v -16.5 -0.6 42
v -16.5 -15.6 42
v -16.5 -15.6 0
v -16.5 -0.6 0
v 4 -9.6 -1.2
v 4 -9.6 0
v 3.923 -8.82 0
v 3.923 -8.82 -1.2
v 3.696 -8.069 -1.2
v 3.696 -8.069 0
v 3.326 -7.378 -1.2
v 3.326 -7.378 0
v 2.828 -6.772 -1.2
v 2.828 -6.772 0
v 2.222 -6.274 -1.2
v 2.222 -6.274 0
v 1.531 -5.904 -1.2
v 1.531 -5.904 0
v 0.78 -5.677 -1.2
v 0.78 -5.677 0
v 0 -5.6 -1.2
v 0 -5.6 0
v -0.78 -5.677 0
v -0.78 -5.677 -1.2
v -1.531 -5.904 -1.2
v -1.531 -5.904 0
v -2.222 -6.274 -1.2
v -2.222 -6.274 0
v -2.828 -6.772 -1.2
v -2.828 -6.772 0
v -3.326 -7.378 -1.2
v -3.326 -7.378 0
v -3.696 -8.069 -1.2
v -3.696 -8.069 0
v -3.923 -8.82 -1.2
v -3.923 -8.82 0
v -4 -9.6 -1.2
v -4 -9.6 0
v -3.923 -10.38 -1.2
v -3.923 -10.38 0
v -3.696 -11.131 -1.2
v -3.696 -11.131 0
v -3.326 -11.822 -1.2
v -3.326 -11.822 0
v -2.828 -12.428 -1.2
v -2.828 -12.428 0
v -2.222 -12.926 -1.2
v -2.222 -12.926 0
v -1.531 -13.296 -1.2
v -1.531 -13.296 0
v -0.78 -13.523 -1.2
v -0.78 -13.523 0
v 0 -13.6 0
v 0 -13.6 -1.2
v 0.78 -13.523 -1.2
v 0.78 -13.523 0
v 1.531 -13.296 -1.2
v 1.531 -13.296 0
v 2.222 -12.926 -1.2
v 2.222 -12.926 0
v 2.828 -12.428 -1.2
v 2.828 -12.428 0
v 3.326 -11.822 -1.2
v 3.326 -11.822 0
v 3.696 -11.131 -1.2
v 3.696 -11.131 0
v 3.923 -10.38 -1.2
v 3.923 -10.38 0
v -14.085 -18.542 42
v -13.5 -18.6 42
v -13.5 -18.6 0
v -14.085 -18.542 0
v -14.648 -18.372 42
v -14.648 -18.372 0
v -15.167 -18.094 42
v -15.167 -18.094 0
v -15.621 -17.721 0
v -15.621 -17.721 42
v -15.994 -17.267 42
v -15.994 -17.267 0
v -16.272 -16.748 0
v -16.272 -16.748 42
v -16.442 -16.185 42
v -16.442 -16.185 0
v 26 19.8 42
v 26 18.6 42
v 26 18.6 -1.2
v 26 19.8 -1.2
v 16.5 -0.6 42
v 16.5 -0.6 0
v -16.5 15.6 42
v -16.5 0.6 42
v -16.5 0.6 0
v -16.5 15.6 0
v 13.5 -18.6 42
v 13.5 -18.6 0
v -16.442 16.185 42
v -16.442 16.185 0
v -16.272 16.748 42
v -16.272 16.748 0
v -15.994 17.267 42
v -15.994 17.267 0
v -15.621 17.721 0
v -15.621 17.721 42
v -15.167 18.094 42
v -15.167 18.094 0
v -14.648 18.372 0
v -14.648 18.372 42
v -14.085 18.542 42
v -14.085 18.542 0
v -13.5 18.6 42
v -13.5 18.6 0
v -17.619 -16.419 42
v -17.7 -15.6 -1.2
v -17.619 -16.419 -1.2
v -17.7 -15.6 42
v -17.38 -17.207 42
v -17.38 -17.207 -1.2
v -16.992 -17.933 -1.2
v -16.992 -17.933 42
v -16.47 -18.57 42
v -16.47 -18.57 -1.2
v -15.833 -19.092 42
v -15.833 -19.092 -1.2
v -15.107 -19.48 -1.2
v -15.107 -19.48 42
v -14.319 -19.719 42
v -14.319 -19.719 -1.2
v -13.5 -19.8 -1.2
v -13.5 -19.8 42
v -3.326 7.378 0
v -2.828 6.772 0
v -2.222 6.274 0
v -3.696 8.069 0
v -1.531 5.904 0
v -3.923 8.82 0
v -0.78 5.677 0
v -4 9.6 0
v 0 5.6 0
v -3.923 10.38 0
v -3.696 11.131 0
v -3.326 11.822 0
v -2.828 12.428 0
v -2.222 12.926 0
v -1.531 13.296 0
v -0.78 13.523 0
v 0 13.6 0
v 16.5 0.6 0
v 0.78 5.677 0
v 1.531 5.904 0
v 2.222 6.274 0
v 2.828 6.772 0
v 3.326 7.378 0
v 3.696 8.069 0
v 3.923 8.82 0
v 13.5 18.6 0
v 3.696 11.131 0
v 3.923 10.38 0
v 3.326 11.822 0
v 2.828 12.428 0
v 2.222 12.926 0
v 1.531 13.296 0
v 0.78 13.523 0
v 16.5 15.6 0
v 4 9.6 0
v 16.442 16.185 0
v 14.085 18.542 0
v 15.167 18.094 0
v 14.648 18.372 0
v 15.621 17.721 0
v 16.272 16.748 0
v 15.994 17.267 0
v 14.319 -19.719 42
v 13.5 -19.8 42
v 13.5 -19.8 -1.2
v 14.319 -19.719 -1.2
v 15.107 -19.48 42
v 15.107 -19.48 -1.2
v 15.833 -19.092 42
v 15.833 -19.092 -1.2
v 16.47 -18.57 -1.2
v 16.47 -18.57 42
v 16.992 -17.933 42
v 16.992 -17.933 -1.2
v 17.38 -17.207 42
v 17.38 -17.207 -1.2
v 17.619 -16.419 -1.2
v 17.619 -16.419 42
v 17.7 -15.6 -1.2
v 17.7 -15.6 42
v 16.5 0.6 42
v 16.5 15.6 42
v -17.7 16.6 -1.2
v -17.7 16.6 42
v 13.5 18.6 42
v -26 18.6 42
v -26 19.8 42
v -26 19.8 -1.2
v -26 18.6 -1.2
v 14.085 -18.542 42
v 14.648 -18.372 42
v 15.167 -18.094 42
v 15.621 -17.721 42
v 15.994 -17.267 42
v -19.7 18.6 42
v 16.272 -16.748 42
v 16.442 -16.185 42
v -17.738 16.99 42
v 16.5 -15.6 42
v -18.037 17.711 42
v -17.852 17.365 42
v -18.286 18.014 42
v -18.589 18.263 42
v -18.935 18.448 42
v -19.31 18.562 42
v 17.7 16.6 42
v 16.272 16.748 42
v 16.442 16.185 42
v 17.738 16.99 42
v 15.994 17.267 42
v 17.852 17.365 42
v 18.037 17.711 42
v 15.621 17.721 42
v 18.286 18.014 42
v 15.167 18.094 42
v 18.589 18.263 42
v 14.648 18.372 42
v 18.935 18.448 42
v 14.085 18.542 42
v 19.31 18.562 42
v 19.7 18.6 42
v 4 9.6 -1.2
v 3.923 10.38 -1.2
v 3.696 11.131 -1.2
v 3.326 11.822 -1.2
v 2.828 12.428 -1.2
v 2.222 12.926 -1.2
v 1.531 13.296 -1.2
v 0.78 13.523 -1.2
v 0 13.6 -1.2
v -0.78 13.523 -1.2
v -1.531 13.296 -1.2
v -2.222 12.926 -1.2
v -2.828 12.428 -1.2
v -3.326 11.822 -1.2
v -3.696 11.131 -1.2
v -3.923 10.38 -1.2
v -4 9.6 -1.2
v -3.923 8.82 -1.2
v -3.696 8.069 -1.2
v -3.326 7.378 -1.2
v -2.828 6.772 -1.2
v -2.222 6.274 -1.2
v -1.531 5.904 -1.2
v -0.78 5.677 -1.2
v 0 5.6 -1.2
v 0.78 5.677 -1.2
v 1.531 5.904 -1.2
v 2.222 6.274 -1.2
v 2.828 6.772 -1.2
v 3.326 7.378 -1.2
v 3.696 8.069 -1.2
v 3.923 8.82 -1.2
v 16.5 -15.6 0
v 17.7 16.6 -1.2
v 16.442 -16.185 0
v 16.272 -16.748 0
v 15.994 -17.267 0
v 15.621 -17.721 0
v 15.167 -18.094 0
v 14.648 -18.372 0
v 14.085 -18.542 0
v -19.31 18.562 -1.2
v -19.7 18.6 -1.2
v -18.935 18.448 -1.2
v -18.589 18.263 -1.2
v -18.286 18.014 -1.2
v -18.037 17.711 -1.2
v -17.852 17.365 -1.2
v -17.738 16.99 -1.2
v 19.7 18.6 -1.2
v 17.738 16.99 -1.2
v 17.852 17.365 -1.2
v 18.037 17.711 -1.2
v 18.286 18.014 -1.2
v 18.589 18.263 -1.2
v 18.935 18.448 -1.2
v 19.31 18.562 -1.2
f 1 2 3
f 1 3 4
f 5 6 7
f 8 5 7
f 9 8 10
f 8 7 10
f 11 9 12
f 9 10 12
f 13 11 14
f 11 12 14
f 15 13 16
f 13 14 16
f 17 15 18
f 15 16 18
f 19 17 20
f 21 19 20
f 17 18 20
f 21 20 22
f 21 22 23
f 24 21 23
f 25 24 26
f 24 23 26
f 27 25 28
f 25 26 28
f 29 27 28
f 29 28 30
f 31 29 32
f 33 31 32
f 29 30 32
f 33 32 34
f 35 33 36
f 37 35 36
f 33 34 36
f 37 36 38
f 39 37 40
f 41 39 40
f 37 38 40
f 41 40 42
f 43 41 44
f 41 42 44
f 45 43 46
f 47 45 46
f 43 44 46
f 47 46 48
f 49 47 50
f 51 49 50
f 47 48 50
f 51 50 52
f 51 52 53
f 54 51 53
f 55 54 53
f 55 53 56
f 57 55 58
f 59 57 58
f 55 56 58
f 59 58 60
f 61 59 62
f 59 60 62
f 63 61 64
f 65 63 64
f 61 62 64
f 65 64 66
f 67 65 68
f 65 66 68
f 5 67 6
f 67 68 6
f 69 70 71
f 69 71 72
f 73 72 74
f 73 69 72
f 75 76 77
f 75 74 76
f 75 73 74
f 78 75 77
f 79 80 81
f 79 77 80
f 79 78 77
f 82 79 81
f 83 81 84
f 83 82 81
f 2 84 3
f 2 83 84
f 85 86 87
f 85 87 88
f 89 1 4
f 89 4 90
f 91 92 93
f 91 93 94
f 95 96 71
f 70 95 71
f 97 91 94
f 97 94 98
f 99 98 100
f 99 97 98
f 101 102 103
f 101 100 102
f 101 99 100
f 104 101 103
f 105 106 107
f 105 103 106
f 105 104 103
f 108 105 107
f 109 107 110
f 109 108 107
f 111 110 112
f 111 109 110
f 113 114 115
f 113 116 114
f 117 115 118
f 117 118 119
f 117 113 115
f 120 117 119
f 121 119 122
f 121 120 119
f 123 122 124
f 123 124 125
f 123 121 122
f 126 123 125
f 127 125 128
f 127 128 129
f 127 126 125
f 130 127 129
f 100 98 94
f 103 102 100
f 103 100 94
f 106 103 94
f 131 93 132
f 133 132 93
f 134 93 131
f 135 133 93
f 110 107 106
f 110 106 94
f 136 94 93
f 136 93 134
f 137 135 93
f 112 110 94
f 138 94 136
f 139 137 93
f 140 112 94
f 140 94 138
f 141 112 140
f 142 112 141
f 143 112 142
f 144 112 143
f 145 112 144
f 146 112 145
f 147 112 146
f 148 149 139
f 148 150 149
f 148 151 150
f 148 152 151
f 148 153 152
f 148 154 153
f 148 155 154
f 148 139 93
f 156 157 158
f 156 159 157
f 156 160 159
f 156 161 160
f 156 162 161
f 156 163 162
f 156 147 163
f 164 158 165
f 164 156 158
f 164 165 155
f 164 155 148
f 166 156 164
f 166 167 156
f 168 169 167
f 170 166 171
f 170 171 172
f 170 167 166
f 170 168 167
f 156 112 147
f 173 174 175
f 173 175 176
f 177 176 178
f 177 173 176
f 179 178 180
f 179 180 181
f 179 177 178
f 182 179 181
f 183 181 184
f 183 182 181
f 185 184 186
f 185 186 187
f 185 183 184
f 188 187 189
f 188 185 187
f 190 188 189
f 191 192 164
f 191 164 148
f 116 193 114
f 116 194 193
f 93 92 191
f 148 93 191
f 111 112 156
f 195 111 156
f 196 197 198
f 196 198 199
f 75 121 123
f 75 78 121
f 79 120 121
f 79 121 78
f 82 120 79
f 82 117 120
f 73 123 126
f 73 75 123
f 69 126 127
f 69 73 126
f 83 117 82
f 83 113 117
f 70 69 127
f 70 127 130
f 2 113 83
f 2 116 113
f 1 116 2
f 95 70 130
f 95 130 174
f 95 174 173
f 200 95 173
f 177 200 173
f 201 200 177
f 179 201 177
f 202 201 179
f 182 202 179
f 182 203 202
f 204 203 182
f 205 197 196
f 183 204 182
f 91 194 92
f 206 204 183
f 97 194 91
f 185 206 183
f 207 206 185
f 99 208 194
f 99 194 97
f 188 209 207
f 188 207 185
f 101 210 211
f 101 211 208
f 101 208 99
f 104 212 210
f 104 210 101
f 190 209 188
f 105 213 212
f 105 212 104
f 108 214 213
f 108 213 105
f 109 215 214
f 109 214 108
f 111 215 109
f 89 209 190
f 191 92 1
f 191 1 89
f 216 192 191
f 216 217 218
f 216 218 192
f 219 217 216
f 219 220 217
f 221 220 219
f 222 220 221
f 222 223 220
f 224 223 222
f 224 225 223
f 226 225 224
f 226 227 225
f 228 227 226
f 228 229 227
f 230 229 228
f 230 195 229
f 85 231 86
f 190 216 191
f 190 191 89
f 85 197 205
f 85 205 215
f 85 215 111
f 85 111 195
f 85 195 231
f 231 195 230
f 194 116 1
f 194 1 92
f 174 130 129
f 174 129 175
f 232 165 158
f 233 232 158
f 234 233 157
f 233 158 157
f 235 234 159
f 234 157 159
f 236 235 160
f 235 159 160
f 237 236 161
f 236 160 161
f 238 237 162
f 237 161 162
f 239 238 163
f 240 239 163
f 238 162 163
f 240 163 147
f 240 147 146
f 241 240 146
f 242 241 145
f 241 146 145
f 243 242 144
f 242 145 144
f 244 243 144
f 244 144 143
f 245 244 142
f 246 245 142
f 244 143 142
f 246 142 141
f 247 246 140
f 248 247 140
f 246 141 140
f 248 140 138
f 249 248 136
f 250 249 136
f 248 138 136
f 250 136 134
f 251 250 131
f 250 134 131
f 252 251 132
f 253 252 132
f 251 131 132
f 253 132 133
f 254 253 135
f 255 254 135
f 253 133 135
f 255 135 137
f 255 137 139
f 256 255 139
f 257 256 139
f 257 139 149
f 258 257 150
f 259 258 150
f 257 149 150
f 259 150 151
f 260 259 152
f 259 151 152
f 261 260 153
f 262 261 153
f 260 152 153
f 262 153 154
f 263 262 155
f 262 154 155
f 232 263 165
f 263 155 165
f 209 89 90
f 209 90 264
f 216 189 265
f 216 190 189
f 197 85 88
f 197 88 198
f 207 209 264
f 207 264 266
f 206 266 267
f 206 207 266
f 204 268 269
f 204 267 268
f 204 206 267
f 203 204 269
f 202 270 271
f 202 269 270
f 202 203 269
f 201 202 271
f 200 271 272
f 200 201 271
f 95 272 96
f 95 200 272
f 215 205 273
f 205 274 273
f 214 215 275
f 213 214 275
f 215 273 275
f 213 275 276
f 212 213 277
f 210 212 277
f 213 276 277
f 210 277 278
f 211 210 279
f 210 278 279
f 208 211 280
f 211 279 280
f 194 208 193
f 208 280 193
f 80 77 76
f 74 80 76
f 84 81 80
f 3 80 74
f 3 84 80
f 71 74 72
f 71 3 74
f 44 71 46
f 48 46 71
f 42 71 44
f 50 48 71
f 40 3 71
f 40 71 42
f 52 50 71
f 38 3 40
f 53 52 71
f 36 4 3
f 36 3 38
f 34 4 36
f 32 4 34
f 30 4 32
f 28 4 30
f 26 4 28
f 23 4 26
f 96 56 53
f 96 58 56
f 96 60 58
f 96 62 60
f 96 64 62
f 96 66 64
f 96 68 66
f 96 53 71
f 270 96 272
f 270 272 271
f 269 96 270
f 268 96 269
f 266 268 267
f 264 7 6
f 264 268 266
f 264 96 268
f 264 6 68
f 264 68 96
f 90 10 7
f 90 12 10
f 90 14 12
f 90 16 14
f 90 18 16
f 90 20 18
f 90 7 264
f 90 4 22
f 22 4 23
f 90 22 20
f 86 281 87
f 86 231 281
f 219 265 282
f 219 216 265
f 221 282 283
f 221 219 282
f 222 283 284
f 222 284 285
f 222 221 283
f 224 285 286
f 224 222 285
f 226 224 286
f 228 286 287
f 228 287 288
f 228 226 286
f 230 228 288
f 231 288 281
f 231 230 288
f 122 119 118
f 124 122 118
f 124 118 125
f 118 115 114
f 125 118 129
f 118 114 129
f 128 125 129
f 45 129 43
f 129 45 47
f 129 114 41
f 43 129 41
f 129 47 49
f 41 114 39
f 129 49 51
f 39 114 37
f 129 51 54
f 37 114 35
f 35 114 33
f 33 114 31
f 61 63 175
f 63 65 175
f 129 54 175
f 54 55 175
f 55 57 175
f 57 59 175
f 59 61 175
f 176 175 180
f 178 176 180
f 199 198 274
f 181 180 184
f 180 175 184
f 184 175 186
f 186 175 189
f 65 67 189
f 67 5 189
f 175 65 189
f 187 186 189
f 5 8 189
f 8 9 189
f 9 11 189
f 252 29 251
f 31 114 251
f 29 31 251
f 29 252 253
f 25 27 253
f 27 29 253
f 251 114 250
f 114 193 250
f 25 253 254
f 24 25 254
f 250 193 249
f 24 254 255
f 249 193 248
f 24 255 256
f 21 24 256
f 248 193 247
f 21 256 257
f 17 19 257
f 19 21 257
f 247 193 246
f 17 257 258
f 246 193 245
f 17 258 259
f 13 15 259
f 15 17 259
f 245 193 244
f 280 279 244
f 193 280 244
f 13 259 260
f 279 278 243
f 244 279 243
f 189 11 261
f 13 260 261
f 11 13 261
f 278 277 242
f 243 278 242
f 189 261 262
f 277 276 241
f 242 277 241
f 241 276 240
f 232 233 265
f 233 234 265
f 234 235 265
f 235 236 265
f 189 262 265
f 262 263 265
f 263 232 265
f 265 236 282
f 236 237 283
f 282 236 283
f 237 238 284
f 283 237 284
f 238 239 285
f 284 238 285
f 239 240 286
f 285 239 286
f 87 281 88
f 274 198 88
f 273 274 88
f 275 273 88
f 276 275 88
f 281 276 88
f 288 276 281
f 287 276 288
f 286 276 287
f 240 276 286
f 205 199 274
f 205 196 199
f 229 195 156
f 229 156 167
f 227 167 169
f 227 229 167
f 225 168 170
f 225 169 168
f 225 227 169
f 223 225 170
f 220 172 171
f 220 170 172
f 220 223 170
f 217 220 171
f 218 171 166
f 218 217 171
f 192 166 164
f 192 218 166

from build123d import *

# Parameters (mm, degrees)
F0_W          = 33
F0_H          = 1.2
F1_DEPTH      = 42
F1_DEPTH_BACK = 1.2
F0_R          = 4
F2_DEPTH      = 1.2
F3_R          = 2


with BuildPart() as f1:
    # F0 (on Top) → F1 (new body, two sides)
    with BuildSketch(Plane.XY) as f1_sk:
        with BuildLine():
            Line((-17.7, 15.6), (-17.7, -15.6))
            ThreePointArc((-17.7, -15.6), (-16.469848, -18.569848), (-13.5, -19.8))
            Line((-13.5, -19.8), (13.5, -19.8))
            ThreePointArc((13.5, -19.8), (16.469848, -18.569848), (17.7, -15.6))
            Line((17.7, -15.6), (17.7, 15.6))
            Line((17.7, 15.6), (17.7, 18.6))
            Line((17.7, 18.6), (26, 18.6))
            Line((26, 18.6), (26, 19.8))
            Line((26, 19.8), (-26, 19.8))
            Line((-26, 19.8), (-26, 18.6))
            Line((-26, 18.6), (-17.7, 18.6))
            Line((-17.7, 18.6), (-17.7, 15.6))
        make_face()
        with BuildLine():
            ThreePointArc((16.5, -15.6), (15.62132, -17.72132), (13.5, -18.6))
            Line((13.5, -18.6), (-13.5, -18.6))
            ThreePointArc((-13.5, -18.6), (-15.62132, -17.72132), (-16.5, -15.6))
            Line((-16.5, -15.6), (-16.5, -0.6))
            Line((-16.5, -0.6), (-16.5, 0.6))
            Line((-16.5, 0.6), (-16.5, 15.6))
            ThreePointArc((-16.5, 15.6), (-15.62132, 17.72132), (-13.5, 18.6))
            Line((-13.5, 18.6), (13.5, 18.6))
            ThreePointArc((13.5, 18.6), (15.62132, 17.72132), (16.5, 15.6))
            Line((16.5, 15.6), (16.5, 0.6))
            Line((16.5, 0.6), (16.5, -0.6))
            Line((16.5, -0.6), (16.5, -15.6))
        make_face(mode=Mode.SUBTRACT)
        Rectangle(F0_W, F0_H)
    extrude(amount=F1_DEPTH)
    extrude(f1_sk.sketch, amount=-F1_DEPTH_BACK)

    # F0 (on Top) → F2 (join)
    with BuildSketch(Plane.XY):
        with BuildLine():
            Line((-16.5, 0.6), (16.5, 0.6))
            Line((16.5, 0.6), (16.5, 15.6))
            ThreePointArc((16.5, 15.6), (15.62132, 17.72132), (13.5, 18.6))
            Line((13.5, 18.6), (-13.5, 18.6))
            ThreePointArc((-13.5, 18.6), (-15.62132, 17.72132), (-16.5, 15.6))
            Line((-16.5, 15.6), (-16.5, 0.6))
        make_face()
        with Locations((0, 9.6)):
            Circle(F0_R, mode=Mode.SUBTRACT)
        Rectangle(F0_W, F0_H)
        with BuildLine():
            Line((-13.5, -18.6), (13.5, -18.6))
            ThreePointArc((13.5, -18.6), (15.62132, -17.72132), (16.5, -15.6))
            Line((16.5, -15.6), (16.5, -0.6))
            Line((16.5, -0.6), (-16.5, -0.6))
            Line((-16.5, -0.6), (-16.5, -15.6))
            ThreePointArc((-16.5, -15.6), (-15.62132, -17.72132), (-13.5, -18.6))
        make_face()
        with Locations((0, -9.6)):
            Circle(F0_R, mode=Mode.SUBTRACT)
    extrude(amount=-F2_DEPTH)

    # F3
    f3_edges = [f1.edges().sort_by_distance(p)[0] for p in [
        (-17.7, 18.6, 20.4),
        (17.7, 18.6, 20.4),
    ]]
    fillet(f3_edges, radius=F3_R)


solid = f1.part
